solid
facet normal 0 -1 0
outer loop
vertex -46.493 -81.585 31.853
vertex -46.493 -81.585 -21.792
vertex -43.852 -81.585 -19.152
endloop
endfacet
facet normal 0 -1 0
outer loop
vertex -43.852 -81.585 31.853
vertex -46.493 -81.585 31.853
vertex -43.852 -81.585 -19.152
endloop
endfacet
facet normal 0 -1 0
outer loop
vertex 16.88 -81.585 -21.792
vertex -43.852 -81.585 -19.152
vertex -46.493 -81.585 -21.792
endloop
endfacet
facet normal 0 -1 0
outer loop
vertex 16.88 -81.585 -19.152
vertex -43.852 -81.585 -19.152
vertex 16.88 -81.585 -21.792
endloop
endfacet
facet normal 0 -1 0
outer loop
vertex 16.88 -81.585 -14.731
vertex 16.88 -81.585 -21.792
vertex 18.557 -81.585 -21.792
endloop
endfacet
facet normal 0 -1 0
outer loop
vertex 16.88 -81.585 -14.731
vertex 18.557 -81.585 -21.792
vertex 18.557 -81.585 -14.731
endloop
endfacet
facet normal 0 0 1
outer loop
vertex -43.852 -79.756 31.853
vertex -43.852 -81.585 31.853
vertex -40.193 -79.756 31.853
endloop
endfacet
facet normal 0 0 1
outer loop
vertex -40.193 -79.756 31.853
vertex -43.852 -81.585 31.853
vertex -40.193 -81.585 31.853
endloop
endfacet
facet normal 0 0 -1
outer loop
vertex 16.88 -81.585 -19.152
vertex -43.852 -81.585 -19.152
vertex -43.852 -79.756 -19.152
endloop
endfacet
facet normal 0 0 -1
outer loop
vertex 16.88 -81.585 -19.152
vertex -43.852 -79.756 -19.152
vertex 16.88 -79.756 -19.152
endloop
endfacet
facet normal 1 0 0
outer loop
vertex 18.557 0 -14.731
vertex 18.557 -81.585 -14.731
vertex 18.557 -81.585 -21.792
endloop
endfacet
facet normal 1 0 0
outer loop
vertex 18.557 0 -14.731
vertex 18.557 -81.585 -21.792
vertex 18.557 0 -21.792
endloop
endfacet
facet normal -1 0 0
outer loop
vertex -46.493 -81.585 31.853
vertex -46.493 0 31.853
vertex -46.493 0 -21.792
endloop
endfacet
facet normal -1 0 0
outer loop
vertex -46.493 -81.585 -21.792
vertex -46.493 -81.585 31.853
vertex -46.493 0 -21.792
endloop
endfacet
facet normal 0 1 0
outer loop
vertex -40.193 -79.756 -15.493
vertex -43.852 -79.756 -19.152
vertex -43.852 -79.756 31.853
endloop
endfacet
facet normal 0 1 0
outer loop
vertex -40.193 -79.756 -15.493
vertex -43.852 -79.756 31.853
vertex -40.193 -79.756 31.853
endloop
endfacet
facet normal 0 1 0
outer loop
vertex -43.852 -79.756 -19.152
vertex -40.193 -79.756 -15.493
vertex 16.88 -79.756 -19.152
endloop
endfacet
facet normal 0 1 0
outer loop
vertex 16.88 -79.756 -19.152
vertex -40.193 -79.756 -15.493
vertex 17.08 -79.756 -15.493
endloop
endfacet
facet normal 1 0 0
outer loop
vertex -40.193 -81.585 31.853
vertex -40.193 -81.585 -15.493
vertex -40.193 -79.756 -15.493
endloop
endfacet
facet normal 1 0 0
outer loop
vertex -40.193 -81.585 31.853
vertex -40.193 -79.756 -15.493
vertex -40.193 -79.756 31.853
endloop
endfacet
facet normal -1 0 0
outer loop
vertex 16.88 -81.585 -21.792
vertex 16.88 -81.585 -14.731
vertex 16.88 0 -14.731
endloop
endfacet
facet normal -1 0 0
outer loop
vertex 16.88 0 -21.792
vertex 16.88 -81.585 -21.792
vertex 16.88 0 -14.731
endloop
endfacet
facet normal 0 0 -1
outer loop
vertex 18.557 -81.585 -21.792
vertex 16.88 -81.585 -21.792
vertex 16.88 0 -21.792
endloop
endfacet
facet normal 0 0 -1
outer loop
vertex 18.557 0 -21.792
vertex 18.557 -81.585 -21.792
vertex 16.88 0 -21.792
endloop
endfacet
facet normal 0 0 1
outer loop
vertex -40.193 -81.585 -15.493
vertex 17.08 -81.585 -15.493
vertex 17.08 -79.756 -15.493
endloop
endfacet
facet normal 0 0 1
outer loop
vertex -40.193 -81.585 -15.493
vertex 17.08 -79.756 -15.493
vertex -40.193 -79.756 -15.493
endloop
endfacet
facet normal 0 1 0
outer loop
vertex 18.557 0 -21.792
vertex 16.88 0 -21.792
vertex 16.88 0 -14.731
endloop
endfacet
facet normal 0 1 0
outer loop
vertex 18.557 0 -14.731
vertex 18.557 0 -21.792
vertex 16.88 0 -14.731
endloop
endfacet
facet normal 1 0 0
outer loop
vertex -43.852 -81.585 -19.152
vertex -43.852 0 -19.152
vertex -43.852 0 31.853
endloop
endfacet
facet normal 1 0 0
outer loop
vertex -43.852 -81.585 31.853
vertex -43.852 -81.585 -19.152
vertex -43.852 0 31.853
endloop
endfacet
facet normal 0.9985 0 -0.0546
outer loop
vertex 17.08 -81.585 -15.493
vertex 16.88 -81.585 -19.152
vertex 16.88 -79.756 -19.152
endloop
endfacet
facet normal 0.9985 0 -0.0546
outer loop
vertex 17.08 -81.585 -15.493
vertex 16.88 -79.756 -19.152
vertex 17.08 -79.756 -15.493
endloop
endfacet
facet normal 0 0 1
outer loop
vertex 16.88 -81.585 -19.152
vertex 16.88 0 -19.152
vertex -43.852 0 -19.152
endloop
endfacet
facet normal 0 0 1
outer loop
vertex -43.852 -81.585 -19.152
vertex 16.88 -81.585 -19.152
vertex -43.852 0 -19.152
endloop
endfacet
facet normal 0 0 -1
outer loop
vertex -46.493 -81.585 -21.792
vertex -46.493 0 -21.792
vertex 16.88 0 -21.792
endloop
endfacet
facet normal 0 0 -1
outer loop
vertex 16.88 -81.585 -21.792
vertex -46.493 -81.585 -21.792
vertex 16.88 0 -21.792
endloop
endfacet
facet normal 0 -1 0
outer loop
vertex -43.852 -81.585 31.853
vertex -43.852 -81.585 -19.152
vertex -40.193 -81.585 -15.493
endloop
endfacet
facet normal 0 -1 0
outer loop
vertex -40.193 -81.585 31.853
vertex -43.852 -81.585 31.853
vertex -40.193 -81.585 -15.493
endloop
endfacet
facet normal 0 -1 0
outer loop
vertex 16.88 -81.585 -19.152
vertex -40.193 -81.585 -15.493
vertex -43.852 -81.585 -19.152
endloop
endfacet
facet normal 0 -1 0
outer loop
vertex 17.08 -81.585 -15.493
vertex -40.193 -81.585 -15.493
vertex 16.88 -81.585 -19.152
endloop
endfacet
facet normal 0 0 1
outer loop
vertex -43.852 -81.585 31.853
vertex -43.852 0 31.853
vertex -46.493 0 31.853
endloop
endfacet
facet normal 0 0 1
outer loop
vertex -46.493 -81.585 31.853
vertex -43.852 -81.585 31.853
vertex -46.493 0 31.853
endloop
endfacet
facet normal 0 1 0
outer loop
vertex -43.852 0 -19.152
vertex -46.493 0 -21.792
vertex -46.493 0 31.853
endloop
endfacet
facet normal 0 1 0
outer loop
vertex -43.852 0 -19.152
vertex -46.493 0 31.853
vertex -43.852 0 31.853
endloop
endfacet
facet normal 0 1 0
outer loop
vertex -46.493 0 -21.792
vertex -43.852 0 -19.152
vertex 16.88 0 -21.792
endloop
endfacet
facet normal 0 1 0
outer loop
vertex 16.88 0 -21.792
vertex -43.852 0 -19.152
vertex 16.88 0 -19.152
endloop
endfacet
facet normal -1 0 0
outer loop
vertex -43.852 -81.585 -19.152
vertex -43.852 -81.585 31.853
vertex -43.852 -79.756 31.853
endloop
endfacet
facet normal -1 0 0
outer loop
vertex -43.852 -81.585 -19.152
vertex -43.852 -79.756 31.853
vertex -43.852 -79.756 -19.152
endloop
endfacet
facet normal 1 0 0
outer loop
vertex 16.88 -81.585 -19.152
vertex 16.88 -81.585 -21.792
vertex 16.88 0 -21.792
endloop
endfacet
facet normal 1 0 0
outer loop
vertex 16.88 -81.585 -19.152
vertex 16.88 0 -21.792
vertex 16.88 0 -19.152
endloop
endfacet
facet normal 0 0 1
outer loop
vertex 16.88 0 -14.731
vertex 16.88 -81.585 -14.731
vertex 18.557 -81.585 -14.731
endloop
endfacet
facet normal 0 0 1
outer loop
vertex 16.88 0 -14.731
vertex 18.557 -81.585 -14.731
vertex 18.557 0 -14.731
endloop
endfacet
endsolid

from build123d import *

# Parameters (mm, degrees)
F1_DEPTH = 81.5848
F2_W     = 3.658651373
F2_H     = 47.3456
F2_H_2   = 3.6586527367
F3_DEPTH = 1.8288
F5_W     = 81.5848
F5_H     = 7.0612
F6_DEPTH = 1.6764


with BuildPart() as f1:
    # F0 (on Front) → F1 (new body)
    with BuildSketch(Plane.XZ):
        Polygon((-43.8521401205, 31.8526837044), (-46.4926887475, 31.8526837044), (-46.4926887475, -21.7921162956), (16.880445572, -21.7921162956), (16.880445572, -19.1515690323), (-43.8521401205, -19.1515690323), align=None)
    extrude(amount=F1_DEPTH)


with BuildPart() as f3:
    # F2 (on face) → F3 (new body)
    with BuildSketch(Plane.XZ.offset(81.5848)):
        with Locations((-42.022814434, 8.1798837044)):
            Rectangle(F2_W, F2_H)
        Polygon((17.0799549669, -15.4929162956), (-40.1934887475, -15.4929162956), (-40.1934887475, -19.1515690323), (16.880445572, -19.1515690323), align=None)
        with Locations((-42.022814434, -17.3222426639)):
            Rectangle(F2_W, F2_H_2)
    extrude(amount=-F3_DEPTH)


with BuildPart() as f6:
    # F5 (on face) → F6 (new body)
    with BuildSketch(Plane.YZ.offset(16.880445572)):
        with Locations((-40.7924, -18.2615162956)):
            Rectangle(F5_W, F5_H)
    extrude(amount=F6_DEPTH)


solid = Compound([f1.part, f3.part, f6.part])
